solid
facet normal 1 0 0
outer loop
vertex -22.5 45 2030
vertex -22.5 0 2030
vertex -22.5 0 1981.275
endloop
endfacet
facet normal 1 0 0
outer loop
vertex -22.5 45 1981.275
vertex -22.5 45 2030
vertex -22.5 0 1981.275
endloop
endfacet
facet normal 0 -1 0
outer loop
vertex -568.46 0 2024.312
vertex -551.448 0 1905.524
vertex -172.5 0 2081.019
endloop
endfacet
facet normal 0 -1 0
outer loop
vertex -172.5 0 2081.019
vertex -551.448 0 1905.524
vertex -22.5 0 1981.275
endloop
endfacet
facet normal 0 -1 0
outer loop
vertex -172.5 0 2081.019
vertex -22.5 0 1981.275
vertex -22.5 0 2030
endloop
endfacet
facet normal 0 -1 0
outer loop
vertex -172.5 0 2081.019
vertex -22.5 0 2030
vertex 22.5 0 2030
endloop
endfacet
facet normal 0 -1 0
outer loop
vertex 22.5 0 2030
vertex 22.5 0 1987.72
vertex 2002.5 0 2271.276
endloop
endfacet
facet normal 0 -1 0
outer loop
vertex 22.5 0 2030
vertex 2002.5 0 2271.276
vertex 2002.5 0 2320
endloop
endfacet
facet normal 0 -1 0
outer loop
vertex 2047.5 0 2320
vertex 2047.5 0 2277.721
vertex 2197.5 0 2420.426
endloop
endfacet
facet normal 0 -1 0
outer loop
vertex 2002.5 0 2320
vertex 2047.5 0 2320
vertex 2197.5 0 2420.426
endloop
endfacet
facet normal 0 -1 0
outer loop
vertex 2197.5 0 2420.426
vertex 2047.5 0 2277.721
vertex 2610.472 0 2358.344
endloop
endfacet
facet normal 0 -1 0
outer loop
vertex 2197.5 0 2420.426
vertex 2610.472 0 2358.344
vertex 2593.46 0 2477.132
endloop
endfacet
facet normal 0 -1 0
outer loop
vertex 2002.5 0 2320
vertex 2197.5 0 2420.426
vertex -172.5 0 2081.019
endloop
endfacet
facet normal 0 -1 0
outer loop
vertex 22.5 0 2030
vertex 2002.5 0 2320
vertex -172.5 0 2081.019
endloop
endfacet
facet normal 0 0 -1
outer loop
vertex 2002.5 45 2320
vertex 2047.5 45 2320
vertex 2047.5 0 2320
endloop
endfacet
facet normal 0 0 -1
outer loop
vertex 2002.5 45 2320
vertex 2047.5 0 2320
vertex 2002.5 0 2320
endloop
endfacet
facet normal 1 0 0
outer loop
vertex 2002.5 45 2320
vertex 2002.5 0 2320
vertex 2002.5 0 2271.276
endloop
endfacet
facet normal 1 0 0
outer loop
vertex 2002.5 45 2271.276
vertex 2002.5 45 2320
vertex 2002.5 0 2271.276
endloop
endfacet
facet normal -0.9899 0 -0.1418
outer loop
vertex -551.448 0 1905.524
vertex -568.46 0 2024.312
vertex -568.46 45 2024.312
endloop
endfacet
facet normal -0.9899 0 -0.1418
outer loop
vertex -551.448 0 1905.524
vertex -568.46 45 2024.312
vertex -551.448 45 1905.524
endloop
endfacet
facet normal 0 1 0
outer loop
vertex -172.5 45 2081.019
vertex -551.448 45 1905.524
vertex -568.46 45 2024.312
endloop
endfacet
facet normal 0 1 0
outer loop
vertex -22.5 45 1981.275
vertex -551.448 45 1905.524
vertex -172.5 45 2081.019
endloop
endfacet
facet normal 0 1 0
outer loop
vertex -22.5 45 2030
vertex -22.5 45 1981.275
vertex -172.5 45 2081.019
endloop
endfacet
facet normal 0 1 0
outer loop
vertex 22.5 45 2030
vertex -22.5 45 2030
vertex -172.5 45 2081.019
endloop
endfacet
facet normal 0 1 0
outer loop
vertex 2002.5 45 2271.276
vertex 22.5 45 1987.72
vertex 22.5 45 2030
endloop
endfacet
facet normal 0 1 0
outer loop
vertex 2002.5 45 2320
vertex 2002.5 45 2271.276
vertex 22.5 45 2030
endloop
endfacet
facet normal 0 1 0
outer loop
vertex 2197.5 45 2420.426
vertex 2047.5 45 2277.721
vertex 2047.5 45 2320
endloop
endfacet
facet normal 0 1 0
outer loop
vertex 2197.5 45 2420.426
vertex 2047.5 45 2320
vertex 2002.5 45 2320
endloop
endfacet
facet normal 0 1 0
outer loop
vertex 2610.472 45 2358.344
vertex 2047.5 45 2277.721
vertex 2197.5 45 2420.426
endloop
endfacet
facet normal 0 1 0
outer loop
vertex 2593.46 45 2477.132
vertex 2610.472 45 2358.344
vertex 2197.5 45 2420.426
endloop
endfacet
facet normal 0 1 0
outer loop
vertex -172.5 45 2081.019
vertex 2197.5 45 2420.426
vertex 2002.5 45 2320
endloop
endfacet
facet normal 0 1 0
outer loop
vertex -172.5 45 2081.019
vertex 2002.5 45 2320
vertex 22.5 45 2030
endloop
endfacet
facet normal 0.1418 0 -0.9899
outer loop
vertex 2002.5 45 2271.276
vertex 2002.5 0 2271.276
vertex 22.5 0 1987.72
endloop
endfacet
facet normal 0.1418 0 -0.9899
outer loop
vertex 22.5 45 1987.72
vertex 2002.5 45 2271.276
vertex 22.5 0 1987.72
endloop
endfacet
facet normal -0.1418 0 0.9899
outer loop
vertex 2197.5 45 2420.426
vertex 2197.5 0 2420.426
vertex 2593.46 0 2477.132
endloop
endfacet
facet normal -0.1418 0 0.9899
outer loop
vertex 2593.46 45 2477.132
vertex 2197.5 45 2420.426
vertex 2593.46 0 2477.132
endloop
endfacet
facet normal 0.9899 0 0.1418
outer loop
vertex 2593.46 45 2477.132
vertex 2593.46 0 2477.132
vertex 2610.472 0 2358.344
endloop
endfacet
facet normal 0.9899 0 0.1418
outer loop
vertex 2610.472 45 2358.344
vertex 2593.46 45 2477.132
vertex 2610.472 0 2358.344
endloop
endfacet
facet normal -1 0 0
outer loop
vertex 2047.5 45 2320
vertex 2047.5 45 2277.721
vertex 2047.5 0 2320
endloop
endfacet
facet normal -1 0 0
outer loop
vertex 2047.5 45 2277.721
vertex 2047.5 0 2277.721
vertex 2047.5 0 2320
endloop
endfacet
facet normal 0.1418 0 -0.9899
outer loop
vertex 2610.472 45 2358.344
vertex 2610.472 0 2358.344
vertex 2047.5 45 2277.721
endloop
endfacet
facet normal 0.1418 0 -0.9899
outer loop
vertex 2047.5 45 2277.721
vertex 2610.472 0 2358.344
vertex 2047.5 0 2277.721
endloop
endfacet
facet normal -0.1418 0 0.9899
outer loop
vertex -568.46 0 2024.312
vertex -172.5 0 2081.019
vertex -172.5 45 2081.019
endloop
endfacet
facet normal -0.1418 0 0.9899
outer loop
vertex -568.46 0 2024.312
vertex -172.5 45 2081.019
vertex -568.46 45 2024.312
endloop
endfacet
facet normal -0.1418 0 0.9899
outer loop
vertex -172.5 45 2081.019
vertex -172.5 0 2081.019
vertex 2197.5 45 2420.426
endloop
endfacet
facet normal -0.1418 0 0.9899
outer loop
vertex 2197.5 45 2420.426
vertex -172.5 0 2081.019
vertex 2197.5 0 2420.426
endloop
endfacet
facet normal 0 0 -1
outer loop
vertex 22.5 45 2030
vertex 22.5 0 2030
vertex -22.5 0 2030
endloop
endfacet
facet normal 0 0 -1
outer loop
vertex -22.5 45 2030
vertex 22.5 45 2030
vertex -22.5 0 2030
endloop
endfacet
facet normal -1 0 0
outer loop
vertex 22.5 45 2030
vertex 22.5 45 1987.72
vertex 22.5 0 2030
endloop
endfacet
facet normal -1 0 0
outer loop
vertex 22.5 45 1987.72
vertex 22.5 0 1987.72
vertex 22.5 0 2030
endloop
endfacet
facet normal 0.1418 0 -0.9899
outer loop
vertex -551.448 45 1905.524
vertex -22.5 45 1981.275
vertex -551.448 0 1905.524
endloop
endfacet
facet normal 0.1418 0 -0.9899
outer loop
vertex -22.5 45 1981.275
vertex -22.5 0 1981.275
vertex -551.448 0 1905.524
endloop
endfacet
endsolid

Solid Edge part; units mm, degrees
sketch "Sketch1" plane through (0, 0, 0) normal (0, -1, 0) x (1, 0, 0)
  line L0 (-172.5, 2081.0185) -> (2197.5, 2420.4263)
  line L1 (2197.5, 2420.4263) -> (2593.4601, 2477.1323)
  line L2 (2593.4601, 2477.1323) -> (2610.4719, 2358.3443)
  line L3 (2610.4719, 2358.3443) -> (-551.4483, 1905.5244)
  line L4 (-568.4601, 2024.3125) -> (-551.4483, 1905.5244)
  line L5 (-172.5, 2081.0185) -> (-568.4601, 2024.3125)
extrude "Protrusion1" add sketch "Sketch1" against normal blind 45
sketch "Sketch2" plane through (1021.0059, 0, 2191.3284) normal (0, -1, 0) x (0.9899005, 0, 0.1417637)
  line L0 (1034.368, -18.1474) -> (989.8225, -11.7681)
  line L1 (989.8225, -11.7681) -> (982.9152, -59.9996)
  line L2 (982.9152, -59.9996) -> (1028.3744, -59.9996)
  line L3 (1028.3744, -59.9996) -> (1034.368, -18.1474)
  line L4 (-1011.292, -18.1472) -> (-1055.8376, -11.7678)
  line L5 (-1055.8376, -11.7678) -> (-1062.7449, -60.0004)
  line L6 (-1062.7449, -60.0004) -> (-1017.2858, -60.0004)
  line L7 (-1017.2858, -60.0004) -> (-1011.292, -18.1472)
extrude "ExtrudedCutout_1" cut sketch "Sketch2" against normal blind 99.8305
